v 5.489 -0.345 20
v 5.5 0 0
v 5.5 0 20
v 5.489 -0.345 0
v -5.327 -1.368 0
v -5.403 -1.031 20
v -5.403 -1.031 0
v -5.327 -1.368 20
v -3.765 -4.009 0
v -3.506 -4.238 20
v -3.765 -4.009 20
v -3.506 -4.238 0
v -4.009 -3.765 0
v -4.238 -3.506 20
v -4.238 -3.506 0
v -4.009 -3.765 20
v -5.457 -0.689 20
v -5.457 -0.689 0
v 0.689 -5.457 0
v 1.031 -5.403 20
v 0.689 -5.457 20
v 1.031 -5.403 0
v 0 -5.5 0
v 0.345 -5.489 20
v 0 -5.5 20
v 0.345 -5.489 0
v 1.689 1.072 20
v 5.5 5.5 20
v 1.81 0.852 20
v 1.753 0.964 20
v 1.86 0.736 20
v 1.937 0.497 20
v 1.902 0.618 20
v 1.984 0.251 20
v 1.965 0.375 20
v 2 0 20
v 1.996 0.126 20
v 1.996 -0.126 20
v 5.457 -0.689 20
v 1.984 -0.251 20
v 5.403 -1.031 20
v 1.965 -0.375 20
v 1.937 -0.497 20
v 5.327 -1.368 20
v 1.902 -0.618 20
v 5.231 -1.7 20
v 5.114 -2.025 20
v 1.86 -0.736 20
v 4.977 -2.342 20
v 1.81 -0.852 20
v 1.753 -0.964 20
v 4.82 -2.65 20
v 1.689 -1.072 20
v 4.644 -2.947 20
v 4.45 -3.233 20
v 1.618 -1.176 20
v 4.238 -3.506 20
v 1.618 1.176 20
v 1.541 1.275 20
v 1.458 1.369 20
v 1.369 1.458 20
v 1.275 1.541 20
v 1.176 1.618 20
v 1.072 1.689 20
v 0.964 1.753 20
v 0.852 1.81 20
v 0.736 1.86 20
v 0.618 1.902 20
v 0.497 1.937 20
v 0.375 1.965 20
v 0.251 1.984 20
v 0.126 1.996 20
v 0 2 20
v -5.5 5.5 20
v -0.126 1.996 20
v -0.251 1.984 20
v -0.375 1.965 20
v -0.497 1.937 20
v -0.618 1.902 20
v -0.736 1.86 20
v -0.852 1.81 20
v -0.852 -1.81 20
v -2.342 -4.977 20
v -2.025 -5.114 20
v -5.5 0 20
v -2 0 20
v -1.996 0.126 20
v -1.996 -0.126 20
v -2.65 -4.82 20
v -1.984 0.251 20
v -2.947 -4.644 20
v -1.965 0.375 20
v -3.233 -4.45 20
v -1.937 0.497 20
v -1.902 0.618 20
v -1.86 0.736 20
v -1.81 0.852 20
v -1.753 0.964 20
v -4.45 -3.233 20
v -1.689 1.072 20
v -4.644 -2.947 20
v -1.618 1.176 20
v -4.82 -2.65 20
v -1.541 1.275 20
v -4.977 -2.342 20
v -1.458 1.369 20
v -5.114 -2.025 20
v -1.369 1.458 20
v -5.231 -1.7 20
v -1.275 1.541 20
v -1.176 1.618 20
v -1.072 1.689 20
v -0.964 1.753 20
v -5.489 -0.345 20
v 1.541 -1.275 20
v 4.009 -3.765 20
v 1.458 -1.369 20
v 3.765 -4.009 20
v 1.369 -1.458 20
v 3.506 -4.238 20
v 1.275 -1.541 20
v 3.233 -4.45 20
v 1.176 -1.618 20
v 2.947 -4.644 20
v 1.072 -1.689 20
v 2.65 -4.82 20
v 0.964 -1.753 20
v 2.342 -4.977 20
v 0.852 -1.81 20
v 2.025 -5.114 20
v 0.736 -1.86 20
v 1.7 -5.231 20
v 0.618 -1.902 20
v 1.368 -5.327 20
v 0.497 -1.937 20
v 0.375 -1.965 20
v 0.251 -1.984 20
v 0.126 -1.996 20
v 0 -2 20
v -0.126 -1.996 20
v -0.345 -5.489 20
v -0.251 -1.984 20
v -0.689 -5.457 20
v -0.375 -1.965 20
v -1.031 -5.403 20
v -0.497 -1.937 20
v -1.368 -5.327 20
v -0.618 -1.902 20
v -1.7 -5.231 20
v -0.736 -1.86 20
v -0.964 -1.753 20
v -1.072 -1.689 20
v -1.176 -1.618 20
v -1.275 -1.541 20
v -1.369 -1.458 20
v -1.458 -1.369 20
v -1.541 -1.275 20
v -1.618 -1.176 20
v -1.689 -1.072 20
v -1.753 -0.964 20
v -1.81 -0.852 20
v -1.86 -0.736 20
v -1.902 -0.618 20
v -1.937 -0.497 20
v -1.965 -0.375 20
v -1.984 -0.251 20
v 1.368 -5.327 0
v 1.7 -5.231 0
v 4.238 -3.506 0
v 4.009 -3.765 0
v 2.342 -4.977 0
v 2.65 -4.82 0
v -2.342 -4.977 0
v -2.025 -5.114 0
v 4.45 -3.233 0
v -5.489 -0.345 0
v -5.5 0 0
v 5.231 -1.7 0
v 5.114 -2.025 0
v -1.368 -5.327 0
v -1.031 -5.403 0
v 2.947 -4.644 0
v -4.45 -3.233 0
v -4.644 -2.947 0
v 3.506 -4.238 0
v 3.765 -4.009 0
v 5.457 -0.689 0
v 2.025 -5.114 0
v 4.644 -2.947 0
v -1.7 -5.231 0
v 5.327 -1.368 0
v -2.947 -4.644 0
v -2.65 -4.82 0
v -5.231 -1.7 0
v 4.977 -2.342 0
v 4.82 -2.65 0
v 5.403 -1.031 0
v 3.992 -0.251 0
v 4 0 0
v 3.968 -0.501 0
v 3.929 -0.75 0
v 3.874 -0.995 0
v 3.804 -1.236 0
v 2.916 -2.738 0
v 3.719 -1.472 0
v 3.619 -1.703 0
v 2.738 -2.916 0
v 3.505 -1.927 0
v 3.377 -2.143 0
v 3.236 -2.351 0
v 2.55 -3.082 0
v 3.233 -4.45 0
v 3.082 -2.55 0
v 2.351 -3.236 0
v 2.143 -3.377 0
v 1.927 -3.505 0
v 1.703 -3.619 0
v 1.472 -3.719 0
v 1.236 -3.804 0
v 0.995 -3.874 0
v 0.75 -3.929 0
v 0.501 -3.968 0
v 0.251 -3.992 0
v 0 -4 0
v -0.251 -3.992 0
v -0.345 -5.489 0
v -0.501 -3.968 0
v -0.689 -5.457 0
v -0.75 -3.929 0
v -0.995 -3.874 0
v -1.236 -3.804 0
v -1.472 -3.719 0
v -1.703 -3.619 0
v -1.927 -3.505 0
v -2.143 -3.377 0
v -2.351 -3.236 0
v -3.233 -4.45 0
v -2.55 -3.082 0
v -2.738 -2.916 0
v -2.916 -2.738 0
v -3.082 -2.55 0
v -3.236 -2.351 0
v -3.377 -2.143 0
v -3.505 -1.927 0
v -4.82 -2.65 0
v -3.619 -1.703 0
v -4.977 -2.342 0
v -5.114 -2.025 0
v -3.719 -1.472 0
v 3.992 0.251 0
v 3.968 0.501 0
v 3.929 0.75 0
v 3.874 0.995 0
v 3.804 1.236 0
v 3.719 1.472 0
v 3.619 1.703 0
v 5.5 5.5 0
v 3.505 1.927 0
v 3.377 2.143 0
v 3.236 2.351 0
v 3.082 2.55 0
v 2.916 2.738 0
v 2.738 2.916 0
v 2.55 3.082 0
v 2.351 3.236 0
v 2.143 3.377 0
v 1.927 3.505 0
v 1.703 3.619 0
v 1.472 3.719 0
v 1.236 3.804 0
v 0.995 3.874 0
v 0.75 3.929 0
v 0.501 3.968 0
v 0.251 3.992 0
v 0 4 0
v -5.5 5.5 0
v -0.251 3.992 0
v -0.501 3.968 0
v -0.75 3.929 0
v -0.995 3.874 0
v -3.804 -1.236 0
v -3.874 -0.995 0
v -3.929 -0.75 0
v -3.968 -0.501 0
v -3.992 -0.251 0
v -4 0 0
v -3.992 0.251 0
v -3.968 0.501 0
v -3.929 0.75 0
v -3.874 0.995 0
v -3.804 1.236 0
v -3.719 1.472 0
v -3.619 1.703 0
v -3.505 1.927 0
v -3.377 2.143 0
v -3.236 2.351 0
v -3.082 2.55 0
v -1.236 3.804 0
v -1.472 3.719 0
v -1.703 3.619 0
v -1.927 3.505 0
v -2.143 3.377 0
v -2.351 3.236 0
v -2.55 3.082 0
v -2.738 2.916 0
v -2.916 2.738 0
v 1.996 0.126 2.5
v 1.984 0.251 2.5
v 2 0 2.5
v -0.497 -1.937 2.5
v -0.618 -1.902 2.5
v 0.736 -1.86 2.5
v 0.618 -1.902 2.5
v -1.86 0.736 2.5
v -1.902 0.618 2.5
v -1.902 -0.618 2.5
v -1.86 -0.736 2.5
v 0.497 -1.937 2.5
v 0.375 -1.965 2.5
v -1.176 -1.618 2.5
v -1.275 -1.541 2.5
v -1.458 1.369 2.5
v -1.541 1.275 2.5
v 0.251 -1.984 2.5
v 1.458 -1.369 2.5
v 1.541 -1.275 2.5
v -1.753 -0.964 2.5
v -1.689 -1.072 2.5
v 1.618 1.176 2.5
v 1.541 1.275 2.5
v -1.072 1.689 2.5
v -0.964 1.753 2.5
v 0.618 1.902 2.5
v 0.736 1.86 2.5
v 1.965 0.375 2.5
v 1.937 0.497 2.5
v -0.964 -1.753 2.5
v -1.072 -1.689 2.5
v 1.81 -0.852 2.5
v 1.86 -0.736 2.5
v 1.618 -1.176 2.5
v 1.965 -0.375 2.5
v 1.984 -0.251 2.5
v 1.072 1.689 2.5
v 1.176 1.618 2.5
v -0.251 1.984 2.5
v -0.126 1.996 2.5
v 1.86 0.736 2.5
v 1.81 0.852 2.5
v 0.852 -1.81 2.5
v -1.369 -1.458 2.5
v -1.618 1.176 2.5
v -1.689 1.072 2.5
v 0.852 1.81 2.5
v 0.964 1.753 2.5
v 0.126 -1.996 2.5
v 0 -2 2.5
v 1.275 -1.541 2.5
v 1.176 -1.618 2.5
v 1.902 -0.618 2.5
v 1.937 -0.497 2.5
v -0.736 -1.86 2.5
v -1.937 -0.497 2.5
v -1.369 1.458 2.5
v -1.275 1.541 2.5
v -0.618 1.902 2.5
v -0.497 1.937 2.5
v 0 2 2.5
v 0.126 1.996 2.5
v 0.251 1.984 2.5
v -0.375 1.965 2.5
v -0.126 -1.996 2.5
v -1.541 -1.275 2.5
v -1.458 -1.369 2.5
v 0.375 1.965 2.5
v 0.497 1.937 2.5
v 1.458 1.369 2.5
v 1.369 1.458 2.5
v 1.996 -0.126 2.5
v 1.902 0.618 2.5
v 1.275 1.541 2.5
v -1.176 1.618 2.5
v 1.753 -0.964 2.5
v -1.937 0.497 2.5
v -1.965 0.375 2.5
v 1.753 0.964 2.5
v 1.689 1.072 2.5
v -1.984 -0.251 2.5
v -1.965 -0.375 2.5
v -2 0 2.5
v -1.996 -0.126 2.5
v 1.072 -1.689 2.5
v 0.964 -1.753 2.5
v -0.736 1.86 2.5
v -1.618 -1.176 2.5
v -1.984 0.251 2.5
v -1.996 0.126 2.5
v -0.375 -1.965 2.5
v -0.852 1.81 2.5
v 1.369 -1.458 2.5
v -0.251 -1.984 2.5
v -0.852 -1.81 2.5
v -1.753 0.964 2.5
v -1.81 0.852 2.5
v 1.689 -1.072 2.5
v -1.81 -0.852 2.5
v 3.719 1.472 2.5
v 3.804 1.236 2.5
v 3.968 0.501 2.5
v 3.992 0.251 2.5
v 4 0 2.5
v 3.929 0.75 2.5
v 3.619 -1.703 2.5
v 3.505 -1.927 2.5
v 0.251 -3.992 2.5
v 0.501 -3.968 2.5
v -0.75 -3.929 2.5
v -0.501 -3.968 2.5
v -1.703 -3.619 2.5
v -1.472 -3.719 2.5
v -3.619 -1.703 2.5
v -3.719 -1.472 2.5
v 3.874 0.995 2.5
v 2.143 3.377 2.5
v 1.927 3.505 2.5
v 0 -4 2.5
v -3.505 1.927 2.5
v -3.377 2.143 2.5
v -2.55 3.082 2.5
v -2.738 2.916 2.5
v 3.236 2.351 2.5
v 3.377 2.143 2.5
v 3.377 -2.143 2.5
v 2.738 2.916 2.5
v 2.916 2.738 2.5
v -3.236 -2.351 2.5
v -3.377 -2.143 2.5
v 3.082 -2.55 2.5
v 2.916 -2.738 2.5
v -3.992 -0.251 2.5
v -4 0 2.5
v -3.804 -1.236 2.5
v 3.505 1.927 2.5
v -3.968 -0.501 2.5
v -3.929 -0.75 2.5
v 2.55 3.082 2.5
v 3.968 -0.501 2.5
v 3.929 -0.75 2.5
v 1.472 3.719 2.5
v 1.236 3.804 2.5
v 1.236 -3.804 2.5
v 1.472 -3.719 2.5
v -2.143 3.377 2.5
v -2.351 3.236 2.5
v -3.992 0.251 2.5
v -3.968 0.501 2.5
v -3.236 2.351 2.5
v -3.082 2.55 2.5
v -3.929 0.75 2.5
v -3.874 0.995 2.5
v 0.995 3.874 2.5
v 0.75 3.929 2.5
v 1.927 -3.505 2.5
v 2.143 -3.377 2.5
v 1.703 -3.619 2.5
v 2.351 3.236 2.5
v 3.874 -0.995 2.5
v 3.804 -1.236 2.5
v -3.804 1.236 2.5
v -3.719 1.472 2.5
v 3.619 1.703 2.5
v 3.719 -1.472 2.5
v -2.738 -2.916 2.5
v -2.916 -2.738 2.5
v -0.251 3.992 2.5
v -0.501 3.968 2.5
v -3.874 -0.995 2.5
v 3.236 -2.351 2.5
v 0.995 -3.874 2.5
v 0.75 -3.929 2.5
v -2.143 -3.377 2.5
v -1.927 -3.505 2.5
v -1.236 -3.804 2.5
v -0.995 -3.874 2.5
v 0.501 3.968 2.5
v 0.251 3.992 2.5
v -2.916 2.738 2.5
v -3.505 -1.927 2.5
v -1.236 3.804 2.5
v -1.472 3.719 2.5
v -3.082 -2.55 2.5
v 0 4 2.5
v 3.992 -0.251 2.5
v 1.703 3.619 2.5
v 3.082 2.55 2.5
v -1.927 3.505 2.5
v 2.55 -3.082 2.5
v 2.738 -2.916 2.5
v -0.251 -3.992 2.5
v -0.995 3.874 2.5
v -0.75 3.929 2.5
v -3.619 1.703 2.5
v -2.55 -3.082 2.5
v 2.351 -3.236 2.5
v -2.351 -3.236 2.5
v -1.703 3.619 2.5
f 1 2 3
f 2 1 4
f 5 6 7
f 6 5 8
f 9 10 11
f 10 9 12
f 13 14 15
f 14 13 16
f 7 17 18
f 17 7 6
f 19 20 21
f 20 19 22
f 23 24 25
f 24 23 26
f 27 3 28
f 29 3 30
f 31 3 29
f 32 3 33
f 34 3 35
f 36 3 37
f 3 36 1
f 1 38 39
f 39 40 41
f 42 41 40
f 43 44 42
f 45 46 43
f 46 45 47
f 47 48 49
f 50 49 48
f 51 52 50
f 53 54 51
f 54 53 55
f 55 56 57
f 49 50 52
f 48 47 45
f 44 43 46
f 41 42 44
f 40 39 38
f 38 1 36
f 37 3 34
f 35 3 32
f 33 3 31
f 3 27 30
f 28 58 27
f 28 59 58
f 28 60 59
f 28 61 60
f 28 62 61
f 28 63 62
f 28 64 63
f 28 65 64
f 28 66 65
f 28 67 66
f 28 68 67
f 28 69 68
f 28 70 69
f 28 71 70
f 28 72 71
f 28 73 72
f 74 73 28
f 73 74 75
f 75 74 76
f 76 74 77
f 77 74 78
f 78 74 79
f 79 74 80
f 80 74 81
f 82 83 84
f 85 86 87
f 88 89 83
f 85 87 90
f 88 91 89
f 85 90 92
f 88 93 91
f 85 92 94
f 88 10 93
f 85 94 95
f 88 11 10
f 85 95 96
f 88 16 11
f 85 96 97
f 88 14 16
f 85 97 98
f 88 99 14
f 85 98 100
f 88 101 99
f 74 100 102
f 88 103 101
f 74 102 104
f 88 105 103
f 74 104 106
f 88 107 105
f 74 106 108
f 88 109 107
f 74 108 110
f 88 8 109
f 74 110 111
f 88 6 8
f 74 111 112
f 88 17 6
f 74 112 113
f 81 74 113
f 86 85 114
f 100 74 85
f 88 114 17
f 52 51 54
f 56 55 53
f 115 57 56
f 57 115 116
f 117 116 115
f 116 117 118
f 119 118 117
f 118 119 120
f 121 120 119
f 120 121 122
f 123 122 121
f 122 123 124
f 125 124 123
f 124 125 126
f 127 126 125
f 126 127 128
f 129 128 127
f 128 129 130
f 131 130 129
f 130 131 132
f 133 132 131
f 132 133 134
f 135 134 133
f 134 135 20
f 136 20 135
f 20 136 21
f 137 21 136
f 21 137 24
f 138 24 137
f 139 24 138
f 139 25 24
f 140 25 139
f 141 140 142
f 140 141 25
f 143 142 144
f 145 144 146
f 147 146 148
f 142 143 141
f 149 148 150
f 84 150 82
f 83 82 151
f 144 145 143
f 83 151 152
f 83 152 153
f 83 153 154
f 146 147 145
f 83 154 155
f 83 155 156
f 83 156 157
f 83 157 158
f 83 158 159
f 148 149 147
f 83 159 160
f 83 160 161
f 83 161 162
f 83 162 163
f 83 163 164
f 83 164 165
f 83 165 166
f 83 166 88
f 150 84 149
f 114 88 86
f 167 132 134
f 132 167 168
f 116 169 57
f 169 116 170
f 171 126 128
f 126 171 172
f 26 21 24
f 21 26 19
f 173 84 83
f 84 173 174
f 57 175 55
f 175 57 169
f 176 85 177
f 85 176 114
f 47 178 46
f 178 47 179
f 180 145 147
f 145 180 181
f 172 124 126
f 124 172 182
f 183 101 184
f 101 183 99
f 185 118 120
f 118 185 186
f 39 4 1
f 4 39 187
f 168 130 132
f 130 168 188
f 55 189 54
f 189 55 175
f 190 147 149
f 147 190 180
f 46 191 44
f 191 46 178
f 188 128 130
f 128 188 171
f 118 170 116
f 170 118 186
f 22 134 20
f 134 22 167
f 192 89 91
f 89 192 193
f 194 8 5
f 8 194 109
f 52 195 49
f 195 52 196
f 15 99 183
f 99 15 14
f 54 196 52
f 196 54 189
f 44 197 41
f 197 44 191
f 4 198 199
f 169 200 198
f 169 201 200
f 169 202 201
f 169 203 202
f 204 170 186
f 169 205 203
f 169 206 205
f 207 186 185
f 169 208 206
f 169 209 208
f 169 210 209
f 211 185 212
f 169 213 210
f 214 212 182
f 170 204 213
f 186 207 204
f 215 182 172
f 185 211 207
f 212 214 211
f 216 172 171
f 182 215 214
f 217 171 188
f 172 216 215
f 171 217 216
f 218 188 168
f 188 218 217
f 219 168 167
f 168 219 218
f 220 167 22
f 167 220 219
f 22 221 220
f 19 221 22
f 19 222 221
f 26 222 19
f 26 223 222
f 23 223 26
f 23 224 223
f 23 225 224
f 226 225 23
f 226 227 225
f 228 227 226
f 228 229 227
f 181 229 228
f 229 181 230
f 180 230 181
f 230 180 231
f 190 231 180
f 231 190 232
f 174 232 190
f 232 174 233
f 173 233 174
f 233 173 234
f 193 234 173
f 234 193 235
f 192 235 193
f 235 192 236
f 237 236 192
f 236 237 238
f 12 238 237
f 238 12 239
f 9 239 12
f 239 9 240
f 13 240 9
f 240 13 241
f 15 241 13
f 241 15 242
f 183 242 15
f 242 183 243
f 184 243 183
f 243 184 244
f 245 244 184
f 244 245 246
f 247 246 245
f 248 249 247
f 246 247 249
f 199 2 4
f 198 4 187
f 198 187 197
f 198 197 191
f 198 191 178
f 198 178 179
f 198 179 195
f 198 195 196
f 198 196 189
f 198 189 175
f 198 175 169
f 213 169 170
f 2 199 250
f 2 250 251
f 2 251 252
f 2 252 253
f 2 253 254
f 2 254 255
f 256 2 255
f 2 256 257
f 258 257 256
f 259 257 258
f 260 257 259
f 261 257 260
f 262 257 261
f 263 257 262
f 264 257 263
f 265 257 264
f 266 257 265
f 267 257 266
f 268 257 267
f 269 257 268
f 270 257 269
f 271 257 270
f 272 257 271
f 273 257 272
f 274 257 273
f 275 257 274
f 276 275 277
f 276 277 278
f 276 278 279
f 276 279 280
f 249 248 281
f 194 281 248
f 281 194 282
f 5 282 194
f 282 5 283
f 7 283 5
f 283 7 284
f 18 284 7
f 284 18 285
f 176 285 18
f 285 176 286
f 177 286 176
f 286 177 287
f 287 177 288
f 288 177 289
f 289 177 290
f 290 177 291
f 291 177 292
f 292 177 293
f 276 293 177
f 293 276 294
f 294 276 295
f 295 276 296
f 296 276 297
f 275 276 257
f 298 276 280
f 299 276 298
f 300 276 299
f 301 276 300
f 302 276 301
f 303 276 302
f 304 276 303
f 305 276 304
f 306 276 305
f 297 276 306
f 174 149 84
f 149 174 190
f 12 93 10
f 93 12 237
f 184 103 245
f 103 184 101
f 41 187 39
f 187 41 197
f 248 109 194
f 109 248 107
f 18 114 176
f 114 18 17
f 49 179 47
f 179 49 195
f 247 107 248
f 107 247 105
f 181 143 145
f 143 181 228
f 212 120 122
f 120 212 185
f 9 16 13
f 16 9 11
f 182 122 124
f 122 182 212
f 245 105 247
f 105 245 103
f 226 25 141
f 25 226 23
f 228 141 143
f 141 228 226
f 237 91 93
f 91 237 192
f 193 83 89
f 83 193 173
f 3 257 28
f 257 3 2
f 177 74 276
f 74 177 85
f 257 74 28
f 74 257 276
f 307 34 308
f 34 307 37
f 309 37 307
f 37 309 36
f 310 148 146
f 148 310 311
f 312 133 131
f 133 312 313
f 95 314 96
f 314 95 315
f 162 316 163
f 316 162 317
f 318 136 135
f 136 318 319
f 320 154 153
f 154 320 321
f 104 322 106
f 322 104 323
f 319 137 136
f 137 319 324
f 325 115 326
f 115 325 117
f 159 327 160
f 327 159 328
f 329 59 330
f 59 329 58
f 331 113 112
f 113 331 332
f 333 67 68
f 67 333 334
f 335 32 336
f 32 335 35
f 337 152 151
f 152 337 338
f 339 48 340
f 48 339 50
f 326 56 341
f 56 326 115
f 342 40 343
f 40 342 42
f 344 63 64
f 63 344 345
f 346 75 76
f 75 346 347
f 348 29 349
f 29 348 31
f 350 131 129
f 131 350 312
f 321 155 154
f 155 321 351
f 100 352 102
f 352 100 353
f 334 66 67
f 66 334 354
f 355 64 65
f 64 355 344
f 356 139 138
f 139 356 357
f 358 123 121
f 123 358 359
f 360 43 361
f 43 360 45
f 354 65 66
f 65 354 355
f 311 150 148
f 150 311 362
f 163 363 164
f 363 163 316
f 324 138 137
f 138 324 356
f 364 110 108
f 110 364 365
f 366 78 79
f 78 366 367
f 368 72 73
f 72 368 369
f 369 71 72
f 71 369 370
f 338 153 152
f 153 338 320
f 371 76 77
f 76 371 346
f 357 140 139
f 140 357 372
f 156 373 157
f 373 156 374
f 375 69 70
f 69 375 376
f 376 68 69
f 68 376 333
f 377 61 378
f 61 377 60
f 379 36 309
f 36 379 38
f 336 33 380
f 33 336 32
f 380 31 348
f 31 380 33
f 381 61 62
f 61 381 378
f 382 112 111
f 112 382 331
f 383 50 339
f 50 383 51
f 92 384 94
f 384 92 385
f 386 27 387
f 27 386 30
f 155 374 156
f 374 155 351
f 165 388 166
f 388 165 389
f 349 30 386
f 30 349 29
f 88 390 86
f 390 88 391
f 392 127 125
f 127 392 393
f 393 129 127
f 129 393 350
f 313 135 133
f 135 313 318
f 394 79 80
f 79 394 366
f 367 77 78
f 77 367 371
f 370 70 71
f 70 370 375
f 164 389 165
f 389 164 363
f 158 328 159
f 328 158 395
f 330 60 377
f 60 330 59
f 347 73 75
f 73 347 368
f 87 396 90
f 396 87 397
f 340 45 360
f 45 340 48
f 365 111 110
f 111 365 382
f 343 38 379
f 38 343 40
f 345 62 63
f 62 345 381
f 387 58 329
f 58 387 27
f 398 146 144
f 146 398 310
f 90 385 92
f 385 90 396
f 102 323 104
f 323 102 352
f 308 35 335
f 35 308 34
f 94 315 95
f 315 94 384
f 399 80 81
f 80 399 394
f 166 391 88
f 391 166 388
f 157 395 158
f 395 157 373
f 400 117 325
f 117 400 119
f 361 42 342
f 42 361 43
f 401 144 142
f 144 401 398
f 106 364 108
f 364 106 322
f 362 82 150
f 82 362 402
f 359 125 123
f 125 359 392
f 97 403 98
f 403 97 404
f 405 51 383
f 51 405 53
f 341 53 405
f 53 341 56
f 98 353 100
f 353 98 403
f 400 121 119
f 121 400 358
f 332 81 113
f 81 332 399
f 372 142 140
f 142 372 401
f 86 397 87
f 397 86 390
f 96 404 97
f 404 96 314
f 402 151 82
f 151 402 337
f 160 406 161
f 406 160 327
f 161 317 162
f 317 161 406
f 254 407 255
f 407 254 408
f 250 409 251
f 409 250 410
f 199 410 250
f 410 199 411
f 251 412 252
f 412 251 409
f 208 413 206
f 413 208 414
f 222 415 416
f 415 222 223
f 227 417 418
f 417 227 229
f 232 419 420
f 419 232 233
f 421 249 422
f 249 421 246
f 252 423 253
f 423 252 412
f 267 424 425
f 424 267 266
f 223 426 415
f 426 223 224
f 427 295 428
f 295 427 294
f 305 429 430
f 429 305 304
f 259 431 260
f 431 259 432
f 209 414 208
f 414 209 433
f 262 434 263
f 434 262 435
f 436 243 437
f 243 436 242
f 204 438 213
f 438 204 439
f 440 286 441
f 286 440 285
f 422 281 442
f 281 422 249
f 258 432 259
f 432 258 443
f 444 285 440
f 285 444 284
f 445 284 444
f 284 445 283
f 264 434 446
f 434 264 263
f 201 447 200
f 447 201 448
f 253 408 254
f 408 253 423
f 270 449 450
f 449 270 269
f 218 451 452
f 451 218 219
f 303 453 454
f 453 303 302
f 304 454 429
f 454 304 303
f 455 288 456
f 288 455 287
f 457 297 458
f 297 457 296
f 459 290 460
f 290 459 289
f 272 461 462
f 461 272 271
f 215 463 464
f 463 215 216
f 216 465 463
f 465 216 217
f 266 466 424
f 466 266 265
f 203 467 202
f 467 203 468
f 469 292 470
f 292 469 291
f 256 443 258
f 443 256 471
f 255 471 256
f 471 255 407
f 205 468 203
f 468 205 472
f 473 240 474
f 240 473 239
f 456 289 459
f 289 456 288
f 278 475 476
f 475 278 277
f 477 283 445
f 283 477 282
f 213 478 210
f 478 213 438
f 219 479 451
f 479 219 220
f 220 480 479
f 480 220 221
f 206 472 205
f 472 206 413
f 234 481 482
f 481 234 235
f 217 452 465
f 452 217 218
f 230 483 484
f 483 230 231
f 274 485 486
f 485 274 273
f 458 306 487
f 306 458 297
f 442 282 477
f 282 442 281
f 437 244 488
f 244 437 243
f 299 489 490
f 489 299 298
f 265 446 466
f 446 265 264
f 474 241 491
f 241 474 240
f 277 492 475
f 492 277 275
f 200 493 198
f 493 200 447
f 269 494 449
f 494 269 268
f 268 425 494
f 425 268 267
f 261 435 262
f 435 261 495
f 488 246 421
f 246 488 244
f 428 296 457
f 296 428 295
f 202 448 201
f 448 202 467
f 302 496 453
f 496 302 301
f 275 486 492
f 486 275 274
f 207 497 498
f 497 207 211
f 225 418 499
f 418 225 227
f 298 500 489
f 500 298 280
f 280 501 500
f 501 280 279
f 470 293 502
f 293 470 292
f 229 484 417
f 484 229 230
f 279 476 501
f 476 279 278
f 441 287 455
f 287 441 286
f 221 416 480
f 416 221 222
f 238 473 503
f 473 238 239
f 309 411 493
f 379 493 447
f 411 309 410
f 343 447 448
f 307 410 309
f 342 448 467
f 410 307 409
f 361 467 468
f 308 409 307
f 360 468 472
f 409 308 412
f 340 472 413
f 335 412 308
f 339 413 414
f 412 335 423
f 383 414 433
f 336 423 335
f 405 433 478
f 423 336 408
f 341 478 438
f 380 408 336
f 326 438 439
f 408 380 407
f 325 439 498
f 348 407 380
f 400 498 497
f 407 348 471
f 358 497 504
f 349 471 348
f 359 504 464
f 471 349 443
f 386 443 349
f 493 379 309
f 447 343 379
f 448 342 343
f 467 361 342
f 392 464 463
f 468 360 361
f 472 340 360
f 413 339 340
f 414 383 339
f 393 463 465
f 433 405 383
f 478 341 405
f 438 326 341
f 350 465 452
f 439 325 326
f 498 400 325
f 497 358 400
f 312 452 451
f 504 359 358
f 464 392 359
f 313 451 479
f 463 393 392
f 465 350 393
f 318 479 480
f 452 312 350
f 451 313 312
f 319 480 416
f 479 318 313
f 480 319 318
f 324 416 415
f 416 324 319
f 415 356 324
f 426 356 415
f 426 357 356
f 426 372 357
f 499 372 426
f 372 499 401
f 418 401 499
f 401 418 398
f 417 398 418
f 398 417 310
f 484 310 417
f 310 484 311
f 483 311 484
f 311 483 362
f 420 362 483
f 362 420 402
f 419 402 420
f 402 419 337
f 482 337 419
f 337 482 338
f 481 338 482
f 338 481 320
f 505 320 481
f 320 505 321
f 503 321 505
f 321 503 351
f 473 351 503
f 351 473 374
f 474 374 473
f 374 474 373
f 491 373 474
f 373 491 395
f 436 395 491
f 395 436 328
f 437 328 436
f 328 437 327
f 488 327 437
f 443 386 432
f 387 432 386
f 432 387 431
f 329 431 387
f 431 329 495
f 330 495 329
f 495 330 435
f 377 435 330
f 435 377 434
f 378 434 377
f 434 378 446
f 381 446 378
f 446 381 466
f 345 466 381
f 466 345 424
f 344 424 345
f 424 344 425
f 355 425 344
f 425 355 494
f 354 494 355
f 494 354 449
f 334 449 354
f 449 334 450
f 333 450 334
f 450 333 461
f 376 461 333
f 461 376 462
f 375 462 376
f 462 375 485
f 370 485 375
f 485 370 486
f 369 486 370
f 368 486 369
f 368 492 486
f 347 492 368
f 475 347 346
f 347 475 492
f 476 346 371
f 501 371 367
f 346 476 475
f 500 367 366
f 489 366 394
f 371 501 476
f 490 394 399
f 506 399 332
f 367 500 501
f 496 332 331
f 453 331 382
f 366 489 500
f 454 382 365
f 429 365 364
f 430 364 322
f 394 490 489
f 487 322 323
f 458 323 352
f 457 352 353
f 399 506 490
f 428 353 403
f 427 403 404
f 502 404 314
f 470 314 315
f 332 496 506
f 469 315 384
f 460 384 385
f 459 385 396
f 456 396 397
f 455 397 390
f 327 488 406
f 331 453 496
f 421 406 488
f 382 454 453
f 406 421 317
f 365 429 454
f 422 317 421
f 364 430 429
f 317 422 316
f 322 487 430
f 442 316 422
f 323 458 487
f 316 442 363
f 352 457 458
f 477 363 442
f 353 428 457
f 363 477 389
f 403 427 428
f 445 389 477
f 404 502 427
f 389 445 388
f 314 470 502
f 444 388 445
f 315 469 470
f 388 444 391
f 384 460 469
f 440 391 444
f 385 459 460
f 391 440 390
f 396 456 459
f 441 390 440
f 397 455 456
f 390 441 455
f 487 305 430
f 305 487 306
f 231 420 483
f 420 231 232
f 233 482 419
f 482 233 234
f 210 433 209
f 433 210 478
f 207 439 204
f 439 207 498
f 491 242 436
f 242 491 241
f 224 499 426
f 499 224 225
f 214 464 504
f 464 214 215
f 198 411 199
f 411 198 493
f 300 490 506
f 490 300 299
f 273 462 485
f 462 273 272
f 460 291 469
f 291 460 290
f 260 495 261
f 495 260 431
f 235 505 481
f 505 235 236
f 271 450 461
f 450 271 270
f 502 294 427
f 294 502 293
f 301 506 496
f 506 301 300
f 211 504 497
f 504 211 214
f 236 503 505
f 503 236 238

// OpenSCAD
// Верхний колпак для советской лампы:

$fn = 100; // Разрешение поверхности.

// Основа:
module base() {
	difference() {
		union() {
			difference() {
				cylinder(h = 8, r = 34);
				translate([0, 0, 5]) {
					cylinder(h = 8, r = 31);
				}
			}
			// Задаёт общую высоту конструкции:
			cylinder(h = 14.5, r = 28.5);
		}
		translate([0, 0, -1]) {
			cylinder(h = 22, r = 25);
		}
	}
}

module holes(sideHr = 3) {
	translate([20, 0, -2]) { cylinder(h = 8, r = sideHr); }
	translate([-20, 0, -2]) { cylinder(h = 8, r = sideHr); }
	translate([0, 20, -2]) { cylinder(h = 8, r = 3); }
	translate([0, -20, -2]) { cylinder(h = 8, r = 3); }
}

// Заглушка:
module cap() {
	difference() {
		union() {
			// Основа крышки:
			translate([0, 0, -1]) {
				cylinder(h = 4, r = 28.5);
			}
			// Выступы для крепления:
			translate([20, 0, 0]) {
				cylinder(h = 4.5, r = 5.5);
			}
			translate([-20, 0, 0]) {
				cylinder(h = 4.5, r = 5.5);
			}
		}
		// Центральное отверстие для тумблера типа МТ-1:
		translate([0, 0, -2]) { cylinder(h = 8, r = 5.5); }
		// Отверстия для охлаждения:
		holes(2);
		rotate([0, 0, 30]) { holes(); }
		rotate([0, 0, 60]) { holes(); }
	}
}

module fastener() {
	difference() {
		union() {
			cylinder(h = 20, r = 5.5);
			translate([-5.5, 0, 0]) {
				cube([11, 5.5, 20]);
			}
		}
		translate([0, 0, -1]) {
			cylinder(h = 22, r = 2);
		}
		translate([0, 0, -1]) {
			cylinder(h = 3.5, r = 4);
		}
	}
}

/*union() {
	base();
	translate([0, 0, 15.5]) {
		cap();
	}
}*/

fastener();
